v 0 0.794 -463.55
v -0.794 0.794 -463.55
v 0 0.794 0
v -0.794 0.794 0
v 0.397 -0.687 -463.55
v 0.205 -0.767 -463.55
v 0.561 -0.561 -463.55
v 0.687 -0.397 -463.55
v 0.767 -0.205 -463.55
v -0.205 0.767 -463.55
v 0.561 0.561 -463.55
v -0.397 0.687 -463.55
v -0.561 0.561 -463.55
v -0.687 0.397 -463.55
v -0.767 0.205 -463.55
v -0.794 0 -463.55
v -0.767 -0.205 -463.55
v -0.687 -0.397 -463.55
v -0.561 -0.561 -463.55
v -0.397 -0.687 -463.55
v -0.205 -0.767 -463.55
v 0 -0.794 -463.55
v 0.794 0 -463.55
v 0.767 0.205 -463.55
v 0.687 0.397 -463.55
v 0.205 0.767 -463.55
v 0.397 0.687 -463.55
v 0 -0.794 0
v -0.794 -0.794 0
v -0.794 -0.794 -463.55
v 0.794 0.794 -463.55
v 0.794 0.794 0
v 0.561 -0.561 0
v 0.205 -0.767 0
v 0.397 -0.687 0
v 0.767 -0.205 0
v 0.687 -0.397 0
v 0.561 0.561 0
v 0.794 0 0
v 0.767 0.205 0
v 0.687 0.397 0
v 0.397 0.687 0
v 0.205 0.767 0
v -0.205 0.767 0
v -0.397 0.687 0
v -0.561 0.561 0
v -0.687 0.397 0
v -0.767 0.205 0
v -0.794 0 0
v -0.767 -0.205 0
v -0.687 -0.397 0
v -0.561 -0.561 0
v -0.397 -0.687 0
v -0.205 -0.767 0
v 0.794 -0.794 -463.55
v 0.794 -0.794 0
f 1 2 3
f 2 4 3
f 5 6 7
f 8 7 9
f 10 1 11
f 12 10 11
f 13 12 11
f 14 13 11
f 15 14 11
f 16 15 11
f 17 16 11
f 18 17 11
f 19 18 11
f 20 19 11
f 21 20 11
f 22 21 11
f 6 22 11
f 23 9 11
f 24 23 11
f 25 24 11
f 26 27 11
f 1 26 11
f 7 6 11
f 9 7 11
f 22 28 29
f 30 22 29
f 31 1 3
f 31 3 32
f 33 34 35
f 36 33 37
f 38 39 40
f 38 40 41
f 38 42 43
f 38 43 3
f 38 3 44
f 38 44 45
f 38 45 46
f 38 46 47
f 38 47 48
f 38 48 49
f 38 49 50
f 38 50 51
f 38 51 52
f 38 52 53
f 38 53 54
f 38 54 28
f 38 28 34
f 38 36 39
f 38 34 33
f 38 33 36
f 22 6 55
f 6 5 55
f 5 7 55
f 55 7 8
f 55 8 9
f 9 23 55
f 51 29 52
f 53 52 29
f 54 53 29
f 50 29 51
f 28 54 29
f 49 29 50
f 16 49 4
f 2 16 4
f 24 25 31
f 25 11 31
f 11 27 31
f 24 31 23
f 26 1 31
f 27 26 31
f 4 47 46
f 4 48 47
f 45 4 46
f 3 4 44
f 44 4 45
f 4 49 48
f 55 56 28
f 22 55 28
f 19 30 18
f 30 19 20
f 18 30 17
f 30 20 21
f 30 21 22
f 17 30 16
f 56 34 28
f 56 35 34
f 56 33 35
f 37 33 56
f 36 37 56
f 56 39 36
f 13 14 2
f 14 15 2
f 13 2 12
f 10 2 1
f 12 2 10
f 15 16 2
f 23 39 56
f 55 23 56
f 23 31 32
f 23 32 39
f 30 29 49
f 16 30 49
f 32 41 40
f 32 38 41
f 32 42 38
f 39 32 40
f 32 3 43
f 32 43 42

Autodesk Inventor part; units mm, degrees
ref_plane "YZ Plane" through (0, 0, 0) normal (1, 0, 0) x (0, 1, 0)
ref_plane "XZ Plane" through (0, 0, 0) normal (0, 1, 0) x (-1, 0, 0)
ref_plane "XY Plane" through (0, 0, 0) normal (0, 0, 1) x (1, 0, 0)
sketch "Sketch1" plane through (0, 0, 0) normal (0, 0, 1) x (1, 0, 0)
  circle A0 centre (0, 0) radius 0.7937
  line L0 (-0.7937, 0.7937) -> (0.7937, 0.7938)
  line L1 (0.7937, 0.7938) -> (0.7937, -0.7937)
  line L2 (0.7937, -0.7937) -> (-0.7937, -0.7937)
  line L3 (-0.7937, -0.7937) -> (-0.7937, 0.7937)
  point P0 (-0.7937, 0)
  point P1 (0, -0.7937)
  point P2 (0, 0.7937)
  point P3 (0.7937, 0)
  dimension "d0" = 1.5875
extrude "Extrusion1" add sketch "Sketch1" against normal blind 463.55
properties part number "String" material "Stainless Steel"
